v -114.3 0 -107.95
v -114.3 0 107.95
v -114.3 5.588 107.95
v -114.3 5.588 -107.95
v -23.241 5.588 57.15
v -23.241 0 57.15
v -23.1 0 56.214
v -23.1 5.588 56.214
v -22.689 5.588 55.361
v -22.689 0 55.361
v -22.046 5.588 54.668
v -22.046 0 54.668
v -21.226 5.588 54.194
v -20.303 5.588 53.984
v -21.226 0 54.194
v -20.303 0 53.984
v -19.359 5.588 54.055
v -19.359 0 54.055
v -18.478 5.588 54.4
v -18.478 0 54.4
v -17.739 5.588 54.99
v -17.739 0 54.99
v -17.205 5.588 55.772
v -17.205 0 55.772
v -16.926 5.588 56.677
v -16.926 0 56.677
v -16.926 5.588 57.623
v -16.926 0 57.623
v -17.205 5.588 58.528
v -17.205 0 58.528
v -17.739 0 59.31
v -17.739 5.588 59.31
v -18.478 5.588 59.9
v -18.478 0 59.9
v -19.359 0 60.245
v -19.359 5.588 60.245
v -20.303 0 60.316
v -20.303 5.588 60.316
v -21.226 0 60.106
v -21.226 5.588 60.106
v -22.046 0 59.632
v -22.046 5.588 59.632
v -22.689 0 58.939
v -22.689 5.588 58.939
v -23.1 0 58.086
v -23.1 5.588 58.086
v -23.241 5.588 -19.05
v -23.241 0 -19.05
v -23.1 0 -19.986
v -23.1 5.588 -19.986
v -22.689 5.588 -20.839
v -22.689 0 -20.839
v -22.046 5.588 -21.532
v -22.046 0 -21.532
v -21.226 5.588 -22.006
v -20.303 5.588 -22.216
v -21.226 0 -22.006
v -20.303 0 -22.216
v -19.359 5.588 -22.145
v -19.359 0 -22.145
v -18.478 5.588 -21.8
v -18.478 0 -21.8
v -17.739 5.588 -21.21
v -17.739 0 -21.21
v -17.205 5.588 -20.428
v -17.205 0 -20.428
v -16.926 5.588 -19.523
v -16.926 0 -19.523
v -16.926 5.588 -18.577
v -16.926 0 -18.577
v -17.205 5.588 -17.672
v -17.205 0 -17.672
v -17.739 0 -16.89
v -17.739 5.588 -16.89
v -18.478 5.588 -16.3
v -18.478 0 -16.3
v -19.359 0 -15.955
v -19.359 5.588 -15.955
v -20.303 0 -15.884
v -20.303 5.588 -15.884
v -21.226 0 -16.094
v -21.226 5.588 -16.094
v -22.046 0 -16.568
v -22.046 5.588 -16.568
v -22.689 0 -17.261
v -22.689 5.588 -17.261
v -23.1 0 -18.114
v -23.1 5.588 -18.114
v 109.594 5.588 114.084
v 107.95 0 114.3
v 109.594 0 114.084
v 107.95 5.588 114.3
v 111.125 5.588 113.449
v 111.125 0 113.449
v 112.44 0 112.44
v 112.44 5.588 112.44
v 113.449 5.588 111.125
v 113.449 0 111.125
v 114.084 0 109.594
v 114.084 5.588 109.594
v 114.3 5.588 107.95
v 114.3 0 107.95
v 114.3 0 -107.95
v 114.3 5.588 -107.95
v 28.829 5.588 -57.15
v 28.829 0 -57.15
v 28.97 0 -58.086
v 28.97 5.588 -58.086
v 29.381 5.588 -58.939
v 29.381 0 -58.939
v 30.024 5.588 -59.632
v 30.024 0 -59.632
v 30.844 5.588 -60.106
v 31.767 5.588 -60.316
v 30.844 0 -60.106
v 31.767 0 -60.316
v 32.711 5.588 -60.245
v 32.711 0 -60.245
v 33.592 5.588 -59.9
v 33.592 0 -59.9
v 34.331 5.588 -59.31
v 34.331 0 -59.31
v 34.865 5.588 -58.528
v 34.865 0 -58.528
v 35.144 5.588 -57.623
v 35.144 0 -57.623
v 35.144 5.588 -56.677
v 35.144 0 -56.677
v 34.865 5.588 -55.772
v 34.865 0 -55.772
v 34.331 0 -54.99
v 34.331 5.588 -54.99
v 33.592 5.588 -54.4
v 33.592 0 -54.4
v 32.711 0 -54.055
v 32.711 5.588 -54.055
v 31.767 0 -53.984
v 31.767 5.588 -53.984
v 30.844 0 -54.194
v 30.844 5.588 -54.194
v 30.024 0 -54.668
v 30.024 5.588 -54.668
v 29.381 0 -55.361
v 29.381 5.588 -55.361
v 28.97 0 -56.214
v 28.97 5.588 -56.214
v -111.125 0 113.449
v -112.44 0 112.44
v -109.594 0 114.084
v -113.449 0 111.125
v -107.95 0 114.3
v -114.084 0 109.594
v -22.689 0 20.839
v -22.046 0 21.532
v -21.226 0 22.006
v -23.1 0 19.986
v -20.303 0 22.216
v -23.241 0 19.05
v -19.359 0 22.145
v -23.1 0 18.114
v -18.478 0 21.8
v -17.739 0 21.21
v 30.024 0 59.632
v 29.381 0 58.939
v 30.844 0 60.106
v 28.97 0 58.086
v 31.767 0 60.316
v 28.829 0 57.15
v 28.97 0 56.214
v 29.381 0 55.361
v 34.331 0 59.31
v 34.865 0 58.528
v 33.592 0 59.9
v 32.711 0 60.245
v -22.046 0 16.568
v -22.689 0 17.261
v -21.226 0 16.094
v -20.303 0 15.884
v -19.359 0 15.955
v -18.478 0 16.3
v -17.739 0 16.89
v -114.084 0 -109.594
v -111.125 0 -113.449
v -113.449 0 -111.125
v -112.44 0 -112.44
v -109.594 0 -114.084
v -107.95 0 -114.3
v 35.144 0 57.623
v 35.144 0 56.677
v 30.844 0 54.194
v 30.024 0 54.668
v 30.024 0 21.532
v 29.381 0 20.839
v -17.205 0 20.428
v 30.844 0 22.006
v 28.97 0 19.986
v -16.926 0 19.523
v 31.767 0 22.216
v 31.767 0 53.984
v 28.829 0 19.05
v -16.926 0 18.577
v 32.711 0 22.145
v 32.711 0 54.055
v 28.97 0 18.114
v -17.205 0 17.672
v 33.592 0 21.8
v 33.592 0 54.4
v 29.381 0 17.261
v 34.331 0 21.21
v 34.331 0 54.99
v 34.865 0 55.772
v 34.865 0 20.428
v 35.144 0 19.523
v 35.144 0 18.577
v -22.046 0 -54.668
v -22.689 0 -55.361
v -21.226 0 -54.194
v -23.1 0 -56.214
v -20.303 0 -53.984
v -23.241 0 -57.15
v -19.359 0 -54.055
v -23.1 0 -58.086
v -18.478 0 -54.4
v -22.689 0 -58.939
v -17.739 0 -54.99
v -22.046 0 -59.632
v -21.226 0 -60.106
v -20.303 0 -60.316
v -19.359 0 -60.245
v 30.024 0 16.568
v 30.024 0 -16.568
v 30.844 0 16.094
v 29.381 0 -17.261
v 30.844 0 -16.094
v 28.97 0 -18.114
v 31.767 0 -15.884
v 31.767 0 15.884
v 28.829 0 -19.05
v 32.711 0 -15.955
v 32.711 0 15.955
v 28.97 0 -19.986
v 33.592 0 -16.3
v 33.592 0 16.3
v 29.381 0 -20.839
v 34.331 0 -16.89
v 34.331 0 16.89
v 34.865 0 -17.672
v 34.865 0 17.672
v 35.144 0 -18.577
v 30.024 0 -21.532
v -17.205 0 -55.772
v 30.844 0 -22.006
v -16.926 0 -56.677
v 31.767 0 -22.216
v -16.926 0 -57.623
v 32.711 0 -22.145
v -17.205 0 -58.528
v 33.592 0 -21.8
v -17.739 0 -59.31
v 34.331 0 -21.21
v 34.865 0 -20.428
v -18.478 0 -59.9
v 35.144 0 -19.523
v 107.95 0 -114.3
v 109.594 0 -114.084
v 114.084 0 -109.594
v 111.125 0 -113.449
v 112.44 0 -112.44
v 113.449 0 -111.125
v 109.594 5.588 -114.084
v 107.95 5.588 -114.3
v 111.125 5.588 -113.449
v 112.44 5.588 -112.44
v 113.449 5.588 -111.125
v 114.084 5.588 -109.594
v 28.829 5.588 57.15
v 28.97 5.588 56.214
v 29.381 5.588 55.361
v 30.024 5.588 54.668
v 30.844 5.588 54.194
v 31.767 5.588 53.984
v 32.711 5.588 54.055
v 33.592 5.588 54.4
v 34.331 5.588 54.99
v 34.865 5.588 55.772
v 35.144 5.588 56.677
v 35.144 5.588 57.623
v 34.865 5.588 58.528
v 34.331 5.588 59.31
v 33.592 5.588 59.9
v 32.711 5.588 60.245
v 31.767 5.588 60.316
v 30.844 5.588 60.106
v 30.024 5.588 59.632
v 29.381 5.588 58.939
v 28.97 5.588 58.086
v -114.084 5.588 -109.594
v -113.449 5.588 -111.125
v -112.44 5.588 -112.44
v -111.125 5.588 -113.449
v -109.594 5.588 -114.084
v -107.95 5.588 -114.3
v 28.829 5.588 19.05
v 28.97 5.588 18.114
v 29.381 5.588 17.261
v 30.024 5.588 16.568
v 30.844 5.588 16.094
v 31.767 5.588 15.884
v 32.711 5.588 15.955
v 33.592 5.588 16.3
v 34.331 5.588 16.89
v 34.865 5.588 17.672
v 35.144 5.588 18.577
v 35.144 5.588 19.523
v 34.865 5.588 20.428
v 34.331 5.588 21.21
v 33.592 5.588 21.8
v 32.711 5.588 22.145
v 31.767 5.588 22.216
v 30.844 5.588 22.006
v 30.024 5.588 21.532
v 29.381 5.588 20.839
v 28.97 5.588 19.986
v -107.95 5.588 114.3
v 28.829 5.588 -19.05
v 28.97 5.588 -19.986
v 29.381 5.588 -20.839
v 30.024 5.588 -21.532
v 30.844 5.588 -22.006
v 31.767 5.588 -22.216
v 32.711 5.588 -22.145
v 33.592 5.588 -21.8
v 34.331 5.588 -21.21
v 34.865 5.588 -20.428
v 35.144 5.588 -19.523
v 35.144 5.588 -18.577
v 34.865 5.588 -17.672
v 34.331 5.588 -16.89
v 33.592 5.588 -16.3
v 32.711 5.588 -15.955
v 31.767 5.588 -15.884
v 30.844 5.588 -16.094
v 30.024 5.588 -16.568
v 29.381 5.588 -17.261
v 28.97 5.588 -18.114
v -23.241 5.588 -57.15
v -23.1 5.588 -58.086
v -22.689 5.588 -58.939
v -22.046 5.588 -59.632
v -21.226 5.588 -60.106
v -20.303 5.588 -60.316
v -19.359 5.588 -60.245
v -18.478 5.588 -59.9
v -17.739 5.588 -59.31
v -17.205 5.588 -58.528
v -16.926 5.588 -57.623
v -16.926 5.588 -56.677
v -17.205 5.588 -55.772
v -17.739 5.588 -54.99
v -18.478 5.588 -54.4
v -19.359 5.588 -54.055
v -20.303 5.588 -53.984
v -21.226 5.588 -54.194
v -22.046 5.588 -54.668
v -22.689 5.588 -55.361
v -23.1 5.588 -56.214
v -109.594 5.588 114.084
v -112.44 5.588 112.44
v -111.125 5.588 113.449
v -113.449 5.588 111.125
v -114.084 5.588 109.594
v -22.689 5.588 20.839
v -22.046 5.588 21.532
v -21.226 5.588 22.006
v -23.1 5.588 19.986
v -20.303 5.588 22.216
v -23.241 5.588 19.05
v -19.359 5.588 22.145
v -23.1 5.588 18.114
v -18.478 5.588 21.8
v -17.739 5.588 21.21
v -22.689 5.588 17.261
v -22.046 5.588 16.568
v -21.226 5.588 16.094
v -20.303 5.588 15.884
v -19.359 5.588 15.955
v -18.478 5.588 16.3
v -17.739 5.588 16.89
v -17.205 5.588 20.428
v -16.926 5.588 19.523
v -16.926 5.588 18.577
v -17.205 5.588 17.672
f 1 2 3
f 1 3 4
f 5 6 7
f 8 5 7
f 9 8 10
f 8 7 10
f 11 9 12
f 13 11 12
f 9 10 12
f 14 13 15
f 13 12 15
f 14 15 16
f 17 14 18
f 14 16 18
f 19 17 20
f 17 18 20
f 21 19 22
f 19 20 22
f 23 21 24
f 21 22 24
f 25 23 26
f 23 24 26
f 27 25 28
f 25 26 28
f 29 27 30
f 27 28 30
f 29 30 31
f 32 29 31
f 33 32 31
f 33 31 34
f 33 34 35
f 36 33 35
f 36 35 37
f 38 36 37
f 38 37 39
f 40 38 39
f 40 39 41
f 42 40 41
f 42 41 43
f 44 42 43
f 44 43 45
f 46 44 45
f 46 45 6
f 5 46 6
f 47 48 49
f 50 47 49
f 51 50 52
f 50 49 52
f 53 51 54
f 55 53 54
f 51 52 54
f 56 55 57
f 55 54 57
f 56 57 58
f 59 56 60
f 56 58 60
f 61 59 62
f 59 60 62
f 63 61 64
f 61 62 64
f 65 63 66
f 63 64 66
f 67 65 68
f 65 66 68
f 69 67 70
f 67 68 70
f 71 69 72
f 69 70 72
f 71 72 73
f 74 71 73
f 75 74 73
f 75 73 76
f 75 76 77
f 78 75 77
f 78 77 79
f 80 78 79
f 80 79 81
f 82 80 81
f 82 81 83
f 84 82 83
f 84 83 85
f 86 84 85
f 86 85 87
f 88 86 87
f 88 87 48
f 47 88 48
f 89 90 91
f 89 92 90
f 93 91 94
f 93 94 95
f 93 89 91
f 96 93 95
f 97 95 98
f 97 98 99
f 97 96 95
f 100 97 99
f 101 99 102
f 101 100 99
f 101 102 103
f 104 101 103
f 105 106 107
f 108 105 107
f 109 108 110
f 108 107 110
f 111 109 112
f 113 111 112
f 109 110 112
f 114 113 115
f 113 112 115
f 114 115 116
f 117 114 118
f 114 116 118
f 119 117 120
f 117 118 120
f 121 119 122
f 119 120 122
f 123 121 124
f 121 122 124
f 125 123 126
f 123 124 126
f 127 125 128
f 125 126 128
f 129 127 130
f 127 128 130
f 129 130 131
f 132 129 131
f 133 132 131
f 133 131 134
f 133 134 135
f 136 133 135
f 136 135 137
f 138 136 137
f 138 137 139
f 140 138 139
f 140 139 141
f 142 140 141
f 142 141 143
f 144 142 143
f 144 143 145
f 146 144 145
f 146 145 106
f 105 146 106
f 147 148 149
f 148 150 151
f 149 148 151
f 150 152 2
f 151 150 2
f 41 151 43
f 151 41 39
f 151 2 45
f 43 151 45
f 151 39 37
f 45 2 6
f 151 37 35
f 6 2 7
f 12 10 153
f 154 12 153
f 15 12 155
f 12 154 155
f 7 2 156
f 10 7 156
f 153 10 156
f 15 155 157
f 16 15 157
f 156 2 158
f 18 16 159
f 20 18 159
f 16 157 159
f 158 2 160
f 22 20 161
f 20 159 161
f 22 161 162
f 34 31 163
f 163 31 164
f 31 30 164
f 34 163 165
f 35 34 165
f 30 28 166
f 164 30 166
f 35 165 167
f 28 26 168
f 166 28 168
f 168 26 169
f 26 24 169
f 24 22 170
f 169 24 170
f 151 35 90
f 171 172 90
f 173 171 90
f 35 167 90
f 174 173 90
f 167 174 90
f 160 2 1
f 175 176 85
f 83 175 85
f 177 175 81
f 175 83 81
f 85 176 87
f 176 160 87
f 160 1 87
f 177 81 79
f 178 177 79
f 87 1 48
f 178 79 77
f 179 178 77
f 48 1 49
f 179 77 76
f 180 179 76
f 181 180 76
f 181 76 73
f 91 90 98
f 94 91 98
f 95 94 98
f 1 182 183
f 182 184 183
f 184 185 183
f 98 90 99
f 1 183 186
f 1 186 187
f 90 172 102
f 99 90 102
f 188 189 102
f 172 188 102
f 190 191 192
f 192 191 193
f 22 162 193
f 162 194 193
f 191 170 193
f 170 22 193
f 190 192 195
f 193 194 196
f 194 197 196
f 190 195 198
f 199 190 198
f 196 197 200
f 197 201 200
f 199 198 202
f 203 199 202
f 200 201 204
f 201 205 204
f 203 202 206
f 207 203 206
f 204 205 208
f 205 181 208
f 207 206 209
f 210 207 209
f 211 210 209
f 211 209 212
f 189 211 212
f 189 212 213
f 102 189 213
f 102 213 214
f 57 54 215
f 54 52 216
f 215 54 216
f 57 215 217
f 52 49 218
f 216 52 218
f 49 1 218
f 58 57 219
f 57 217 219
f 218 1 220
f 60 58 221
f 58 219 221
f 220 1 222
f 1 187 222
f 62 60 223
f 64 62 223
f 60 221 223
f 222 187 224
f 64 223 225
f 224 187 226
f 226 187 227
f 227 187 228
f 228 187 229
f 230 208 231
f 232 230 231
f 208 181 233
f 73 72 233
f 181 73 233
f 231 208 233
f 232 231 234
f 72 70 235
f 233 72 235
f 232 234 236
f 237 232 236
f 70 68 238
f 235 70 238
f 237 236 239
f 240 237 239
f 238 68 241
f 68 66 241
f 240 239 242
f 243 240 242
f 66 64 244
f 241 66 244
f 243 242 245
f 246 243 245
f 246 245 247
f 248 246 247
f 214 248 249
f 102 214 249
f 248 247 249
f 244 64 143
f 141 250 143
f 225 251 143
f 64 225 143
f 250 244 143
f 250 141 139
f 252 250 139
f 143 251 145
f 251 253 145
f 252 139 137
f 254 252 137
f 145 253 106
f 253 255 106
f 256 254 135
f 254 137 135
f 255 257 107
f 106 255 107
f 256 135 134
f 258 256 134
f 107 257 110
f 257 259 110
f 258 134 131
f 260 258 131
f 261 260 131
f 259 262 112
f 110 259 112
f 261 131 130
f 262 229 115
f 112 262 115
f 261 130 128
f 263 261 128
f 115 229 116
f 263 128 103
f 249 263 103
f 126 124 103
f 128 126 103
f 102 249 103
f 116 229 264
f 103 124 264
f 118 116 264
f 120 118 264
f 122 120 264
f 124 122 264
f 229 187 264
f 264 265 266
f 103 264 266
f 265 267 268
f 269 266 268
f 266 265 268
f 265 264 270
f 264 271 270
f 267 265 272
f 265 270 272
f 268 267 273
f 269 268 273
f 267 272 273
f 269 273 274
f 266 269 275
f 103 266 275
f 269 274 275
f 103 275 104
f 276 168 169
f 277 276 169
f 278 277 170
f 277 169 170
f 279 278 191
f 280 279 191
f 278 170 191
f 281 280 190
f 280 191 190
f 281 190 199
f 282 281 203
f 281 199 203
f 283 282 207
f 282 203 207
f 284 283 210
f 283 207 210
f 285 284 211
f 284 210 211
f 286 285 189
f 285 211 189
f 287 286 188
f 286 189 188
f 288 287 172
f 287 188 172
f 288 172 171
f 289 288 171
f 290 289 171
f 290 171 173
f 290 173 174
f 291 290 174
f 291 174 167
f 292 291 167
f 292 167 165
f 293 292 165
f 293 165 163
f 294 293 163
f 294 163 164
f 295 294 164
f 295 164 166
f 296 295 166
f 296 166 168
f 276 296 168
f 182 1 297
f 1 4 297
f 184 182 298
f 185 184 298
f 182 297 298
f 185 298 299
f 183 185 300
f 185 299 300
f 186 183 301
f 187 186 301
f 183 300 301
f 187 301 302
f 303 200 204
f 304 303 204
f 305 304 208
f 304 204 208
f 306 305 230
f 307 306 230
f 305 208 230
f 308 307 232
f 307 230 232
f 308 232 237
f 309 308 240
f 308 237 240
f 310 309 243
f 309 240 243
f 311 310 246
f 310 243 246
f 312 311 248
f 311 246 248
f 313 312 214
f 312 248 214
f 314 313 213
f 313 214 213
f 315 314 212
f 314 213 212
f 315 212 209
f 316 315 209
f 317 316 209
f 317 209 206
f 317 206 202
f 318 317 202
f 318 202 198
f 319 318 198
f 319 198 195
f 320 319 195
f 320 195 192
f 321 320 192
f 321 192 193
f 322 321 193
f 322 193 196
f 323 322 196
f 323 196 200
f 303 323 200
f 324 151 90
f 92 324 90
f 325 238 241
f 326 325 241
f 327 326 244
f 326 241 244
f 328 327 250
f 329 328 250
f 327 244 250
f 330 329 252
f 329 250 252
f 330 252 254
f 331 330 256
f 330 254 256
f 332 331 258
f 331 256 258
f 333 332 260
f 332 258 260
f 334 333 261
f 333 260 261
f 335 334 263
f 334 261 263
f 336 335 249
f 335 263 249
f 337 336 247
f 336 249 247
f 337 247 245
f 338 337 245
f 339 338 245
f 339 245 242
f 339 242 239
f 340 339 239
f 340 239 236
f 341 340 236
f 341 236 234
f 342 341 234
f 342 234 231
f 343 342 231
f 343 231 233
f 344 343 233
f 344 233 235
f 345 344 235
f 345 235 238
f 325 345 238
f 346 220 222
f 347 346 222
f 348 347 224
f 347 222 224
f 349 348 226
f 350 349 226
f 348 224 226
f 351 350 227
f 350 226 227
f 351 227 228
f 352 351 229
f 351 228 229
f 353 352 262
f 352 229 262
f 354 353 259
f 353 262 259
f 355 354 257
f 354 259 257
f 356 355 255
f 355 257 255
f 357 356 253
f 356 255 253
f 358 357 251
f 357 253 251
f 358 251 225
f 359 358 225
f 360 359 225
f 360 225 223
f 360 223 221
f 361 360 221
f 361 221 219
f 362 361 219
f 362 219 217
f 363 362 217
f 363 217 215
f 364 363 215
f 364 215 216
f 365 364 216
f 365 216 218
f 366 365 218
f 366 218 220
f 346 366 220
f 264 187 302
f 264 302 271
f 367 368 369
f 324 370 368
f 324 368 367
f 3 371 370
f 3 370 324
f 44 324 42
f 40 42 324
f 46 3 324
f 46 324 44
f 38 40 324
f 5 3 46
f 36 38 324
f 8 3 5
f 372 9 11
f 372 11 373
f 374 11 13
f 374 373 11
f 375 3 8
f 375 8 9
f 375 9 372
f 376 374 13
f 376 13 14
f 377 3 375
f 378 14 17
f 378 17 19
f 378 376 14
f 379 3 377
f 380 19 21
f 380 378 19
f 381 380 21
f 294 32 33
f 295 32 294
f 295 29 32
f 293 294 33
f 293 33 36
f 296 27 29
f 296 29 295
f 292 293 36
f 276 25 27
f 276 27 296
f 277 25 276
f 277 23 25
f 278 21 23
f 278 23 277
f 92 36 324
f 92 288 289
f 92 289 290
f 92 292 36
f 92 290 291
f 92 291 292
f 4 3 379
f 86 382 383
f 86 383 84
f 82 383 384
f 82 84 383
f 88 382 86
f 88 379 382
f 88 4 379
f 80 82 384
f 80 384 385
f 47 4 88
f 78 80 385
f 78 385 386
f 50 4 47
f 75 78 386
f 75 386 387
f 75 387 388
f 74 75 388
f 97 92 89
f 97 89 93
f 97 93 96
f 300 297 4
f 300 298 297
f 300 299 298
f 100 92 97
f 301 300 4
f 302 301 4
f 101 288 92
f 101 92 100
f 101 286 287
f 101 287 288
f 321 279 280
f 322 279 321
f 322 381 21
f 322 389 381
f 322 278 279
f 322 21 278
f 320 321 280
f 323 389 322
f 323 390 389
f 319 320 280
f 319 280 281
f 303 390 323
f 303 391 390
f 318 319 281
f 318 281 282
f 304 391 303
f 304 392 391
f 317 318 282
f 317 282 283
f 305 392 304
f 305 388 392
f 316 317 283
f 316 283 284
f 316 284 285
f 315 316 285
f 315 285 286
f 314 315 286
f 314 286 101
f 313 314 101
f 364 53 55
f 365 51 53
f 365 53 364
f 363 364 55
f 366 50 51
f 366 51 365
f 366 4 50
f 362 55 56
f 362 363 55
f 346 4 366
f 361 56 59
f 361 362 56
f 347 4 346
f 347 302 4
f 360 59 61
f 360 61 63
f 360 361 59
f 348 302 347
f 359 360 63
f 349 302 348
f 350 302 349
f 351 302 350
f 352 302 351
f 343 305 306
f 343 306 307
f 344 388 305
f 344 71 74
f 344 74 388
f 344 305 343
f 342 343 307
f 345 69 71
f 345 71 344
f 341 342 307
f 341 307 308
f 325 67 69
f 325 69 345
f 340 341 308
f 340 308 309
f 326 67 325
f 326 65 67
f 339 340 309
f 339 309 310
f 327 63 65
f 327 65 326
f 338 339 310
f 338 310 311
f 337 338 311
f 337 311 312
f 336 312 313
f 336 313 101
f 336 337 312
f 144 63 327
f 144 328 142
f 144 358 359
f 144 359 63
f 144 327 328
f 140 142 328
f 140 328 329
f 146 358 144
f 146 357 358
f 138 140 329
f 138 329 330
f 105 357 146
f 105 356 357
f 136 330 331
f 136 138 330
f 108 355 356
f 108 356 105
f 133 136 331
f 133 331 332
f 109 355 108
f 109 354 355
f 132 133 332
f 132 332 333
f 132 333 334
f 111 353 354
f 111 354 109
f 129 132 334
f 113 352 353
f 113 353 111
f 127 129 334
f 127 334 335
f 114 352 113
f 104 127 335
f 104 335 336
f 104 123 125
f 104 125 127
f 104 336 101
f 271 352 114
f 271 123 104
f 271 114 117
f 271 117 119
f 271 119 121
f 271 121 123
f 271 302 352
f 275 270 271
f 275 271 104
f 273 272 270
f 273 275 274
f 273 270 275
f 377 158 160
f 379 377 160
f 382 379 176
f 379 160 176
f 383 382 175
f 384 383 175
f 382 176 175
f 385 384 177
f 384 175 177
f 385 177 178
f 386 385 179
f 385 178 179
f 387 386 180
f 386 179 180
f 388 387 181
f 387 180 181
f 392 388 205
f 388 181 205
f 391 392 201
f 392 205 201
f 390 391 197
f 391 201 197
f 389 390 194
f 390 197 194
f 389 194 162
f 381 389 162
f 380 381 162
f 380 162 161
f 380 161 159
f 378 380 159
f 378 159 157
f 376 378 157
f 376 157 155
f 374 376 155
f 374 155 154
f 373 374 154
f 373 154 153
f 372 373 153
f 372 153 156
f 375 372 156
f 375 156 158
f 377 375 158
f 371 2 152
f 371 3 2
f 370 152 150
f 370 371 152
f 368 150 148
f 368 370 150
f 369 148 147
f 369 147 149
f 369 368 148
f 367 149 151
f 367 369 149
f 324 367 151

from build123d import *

# Parameters (mm, degrees)
SKETCH1_W                   = 228.6
SKETCH1_H                   = 228.6
BOSS_EXTRUDE1_DEPTH         = 5.588
F_1_4_0_25_DIAMETER_HOLE1_D = 6.35
LPATTERN1_COUNT             = 4
LPATTERN1_PITCH             = 38.1
FILLET1_R                   = 6.35


with BuildPart() as part:
    # Sketch1 → Boss-Extrude1 (new body)
    with BuildSketch(Plane(origin=(0, 0, 0), x_dir=(1, 0, 0), z_dir=(0, 1, 0))):
        Rectangle(SKETCH1_W, SKETCH1_H)
    extrude(amount=BOSS_EXTRUDE1_DEPTH)

    # 1/4 (0.25) Diameter Hole1 (through all)
    with Locations(Plane(origin=(0, 5.588, 0), x_dir=(1, 0, 0), z_dir=(0, 1, 0))):
        with Locations((-20.066, 57.15), (32.004, 57.15)):
            f_1_4_0_25_diameter_hole1 = Hole(F_1_4_0_25_DIAMETER_HOLE1_D / 2)

    # LPattern1: 1/4 (0.25) Diameter Hole1 ×4
    with Locations(*[(0, 0, i * LPATTERN1_PITCH) for i in range(1, LPATTERN1_COUNT)]):
        add(f_1_4_0_25_diameter_hole1, mode=Mode.SUBTRACT)

    # Fillet1
    fillet1_edges = [part.edges().sort_by_distance(p)[0] for p in [
        (-114.3, 2.794, -114.3),
        (114.3, 2.794, -114.3),
        (114.3, 2.794, 114.3),
        (-114.3, 2.794, 114.3),
    ]]
    fillet(fillet1_edges, radius=FILLET1_R)


solid = part.part
